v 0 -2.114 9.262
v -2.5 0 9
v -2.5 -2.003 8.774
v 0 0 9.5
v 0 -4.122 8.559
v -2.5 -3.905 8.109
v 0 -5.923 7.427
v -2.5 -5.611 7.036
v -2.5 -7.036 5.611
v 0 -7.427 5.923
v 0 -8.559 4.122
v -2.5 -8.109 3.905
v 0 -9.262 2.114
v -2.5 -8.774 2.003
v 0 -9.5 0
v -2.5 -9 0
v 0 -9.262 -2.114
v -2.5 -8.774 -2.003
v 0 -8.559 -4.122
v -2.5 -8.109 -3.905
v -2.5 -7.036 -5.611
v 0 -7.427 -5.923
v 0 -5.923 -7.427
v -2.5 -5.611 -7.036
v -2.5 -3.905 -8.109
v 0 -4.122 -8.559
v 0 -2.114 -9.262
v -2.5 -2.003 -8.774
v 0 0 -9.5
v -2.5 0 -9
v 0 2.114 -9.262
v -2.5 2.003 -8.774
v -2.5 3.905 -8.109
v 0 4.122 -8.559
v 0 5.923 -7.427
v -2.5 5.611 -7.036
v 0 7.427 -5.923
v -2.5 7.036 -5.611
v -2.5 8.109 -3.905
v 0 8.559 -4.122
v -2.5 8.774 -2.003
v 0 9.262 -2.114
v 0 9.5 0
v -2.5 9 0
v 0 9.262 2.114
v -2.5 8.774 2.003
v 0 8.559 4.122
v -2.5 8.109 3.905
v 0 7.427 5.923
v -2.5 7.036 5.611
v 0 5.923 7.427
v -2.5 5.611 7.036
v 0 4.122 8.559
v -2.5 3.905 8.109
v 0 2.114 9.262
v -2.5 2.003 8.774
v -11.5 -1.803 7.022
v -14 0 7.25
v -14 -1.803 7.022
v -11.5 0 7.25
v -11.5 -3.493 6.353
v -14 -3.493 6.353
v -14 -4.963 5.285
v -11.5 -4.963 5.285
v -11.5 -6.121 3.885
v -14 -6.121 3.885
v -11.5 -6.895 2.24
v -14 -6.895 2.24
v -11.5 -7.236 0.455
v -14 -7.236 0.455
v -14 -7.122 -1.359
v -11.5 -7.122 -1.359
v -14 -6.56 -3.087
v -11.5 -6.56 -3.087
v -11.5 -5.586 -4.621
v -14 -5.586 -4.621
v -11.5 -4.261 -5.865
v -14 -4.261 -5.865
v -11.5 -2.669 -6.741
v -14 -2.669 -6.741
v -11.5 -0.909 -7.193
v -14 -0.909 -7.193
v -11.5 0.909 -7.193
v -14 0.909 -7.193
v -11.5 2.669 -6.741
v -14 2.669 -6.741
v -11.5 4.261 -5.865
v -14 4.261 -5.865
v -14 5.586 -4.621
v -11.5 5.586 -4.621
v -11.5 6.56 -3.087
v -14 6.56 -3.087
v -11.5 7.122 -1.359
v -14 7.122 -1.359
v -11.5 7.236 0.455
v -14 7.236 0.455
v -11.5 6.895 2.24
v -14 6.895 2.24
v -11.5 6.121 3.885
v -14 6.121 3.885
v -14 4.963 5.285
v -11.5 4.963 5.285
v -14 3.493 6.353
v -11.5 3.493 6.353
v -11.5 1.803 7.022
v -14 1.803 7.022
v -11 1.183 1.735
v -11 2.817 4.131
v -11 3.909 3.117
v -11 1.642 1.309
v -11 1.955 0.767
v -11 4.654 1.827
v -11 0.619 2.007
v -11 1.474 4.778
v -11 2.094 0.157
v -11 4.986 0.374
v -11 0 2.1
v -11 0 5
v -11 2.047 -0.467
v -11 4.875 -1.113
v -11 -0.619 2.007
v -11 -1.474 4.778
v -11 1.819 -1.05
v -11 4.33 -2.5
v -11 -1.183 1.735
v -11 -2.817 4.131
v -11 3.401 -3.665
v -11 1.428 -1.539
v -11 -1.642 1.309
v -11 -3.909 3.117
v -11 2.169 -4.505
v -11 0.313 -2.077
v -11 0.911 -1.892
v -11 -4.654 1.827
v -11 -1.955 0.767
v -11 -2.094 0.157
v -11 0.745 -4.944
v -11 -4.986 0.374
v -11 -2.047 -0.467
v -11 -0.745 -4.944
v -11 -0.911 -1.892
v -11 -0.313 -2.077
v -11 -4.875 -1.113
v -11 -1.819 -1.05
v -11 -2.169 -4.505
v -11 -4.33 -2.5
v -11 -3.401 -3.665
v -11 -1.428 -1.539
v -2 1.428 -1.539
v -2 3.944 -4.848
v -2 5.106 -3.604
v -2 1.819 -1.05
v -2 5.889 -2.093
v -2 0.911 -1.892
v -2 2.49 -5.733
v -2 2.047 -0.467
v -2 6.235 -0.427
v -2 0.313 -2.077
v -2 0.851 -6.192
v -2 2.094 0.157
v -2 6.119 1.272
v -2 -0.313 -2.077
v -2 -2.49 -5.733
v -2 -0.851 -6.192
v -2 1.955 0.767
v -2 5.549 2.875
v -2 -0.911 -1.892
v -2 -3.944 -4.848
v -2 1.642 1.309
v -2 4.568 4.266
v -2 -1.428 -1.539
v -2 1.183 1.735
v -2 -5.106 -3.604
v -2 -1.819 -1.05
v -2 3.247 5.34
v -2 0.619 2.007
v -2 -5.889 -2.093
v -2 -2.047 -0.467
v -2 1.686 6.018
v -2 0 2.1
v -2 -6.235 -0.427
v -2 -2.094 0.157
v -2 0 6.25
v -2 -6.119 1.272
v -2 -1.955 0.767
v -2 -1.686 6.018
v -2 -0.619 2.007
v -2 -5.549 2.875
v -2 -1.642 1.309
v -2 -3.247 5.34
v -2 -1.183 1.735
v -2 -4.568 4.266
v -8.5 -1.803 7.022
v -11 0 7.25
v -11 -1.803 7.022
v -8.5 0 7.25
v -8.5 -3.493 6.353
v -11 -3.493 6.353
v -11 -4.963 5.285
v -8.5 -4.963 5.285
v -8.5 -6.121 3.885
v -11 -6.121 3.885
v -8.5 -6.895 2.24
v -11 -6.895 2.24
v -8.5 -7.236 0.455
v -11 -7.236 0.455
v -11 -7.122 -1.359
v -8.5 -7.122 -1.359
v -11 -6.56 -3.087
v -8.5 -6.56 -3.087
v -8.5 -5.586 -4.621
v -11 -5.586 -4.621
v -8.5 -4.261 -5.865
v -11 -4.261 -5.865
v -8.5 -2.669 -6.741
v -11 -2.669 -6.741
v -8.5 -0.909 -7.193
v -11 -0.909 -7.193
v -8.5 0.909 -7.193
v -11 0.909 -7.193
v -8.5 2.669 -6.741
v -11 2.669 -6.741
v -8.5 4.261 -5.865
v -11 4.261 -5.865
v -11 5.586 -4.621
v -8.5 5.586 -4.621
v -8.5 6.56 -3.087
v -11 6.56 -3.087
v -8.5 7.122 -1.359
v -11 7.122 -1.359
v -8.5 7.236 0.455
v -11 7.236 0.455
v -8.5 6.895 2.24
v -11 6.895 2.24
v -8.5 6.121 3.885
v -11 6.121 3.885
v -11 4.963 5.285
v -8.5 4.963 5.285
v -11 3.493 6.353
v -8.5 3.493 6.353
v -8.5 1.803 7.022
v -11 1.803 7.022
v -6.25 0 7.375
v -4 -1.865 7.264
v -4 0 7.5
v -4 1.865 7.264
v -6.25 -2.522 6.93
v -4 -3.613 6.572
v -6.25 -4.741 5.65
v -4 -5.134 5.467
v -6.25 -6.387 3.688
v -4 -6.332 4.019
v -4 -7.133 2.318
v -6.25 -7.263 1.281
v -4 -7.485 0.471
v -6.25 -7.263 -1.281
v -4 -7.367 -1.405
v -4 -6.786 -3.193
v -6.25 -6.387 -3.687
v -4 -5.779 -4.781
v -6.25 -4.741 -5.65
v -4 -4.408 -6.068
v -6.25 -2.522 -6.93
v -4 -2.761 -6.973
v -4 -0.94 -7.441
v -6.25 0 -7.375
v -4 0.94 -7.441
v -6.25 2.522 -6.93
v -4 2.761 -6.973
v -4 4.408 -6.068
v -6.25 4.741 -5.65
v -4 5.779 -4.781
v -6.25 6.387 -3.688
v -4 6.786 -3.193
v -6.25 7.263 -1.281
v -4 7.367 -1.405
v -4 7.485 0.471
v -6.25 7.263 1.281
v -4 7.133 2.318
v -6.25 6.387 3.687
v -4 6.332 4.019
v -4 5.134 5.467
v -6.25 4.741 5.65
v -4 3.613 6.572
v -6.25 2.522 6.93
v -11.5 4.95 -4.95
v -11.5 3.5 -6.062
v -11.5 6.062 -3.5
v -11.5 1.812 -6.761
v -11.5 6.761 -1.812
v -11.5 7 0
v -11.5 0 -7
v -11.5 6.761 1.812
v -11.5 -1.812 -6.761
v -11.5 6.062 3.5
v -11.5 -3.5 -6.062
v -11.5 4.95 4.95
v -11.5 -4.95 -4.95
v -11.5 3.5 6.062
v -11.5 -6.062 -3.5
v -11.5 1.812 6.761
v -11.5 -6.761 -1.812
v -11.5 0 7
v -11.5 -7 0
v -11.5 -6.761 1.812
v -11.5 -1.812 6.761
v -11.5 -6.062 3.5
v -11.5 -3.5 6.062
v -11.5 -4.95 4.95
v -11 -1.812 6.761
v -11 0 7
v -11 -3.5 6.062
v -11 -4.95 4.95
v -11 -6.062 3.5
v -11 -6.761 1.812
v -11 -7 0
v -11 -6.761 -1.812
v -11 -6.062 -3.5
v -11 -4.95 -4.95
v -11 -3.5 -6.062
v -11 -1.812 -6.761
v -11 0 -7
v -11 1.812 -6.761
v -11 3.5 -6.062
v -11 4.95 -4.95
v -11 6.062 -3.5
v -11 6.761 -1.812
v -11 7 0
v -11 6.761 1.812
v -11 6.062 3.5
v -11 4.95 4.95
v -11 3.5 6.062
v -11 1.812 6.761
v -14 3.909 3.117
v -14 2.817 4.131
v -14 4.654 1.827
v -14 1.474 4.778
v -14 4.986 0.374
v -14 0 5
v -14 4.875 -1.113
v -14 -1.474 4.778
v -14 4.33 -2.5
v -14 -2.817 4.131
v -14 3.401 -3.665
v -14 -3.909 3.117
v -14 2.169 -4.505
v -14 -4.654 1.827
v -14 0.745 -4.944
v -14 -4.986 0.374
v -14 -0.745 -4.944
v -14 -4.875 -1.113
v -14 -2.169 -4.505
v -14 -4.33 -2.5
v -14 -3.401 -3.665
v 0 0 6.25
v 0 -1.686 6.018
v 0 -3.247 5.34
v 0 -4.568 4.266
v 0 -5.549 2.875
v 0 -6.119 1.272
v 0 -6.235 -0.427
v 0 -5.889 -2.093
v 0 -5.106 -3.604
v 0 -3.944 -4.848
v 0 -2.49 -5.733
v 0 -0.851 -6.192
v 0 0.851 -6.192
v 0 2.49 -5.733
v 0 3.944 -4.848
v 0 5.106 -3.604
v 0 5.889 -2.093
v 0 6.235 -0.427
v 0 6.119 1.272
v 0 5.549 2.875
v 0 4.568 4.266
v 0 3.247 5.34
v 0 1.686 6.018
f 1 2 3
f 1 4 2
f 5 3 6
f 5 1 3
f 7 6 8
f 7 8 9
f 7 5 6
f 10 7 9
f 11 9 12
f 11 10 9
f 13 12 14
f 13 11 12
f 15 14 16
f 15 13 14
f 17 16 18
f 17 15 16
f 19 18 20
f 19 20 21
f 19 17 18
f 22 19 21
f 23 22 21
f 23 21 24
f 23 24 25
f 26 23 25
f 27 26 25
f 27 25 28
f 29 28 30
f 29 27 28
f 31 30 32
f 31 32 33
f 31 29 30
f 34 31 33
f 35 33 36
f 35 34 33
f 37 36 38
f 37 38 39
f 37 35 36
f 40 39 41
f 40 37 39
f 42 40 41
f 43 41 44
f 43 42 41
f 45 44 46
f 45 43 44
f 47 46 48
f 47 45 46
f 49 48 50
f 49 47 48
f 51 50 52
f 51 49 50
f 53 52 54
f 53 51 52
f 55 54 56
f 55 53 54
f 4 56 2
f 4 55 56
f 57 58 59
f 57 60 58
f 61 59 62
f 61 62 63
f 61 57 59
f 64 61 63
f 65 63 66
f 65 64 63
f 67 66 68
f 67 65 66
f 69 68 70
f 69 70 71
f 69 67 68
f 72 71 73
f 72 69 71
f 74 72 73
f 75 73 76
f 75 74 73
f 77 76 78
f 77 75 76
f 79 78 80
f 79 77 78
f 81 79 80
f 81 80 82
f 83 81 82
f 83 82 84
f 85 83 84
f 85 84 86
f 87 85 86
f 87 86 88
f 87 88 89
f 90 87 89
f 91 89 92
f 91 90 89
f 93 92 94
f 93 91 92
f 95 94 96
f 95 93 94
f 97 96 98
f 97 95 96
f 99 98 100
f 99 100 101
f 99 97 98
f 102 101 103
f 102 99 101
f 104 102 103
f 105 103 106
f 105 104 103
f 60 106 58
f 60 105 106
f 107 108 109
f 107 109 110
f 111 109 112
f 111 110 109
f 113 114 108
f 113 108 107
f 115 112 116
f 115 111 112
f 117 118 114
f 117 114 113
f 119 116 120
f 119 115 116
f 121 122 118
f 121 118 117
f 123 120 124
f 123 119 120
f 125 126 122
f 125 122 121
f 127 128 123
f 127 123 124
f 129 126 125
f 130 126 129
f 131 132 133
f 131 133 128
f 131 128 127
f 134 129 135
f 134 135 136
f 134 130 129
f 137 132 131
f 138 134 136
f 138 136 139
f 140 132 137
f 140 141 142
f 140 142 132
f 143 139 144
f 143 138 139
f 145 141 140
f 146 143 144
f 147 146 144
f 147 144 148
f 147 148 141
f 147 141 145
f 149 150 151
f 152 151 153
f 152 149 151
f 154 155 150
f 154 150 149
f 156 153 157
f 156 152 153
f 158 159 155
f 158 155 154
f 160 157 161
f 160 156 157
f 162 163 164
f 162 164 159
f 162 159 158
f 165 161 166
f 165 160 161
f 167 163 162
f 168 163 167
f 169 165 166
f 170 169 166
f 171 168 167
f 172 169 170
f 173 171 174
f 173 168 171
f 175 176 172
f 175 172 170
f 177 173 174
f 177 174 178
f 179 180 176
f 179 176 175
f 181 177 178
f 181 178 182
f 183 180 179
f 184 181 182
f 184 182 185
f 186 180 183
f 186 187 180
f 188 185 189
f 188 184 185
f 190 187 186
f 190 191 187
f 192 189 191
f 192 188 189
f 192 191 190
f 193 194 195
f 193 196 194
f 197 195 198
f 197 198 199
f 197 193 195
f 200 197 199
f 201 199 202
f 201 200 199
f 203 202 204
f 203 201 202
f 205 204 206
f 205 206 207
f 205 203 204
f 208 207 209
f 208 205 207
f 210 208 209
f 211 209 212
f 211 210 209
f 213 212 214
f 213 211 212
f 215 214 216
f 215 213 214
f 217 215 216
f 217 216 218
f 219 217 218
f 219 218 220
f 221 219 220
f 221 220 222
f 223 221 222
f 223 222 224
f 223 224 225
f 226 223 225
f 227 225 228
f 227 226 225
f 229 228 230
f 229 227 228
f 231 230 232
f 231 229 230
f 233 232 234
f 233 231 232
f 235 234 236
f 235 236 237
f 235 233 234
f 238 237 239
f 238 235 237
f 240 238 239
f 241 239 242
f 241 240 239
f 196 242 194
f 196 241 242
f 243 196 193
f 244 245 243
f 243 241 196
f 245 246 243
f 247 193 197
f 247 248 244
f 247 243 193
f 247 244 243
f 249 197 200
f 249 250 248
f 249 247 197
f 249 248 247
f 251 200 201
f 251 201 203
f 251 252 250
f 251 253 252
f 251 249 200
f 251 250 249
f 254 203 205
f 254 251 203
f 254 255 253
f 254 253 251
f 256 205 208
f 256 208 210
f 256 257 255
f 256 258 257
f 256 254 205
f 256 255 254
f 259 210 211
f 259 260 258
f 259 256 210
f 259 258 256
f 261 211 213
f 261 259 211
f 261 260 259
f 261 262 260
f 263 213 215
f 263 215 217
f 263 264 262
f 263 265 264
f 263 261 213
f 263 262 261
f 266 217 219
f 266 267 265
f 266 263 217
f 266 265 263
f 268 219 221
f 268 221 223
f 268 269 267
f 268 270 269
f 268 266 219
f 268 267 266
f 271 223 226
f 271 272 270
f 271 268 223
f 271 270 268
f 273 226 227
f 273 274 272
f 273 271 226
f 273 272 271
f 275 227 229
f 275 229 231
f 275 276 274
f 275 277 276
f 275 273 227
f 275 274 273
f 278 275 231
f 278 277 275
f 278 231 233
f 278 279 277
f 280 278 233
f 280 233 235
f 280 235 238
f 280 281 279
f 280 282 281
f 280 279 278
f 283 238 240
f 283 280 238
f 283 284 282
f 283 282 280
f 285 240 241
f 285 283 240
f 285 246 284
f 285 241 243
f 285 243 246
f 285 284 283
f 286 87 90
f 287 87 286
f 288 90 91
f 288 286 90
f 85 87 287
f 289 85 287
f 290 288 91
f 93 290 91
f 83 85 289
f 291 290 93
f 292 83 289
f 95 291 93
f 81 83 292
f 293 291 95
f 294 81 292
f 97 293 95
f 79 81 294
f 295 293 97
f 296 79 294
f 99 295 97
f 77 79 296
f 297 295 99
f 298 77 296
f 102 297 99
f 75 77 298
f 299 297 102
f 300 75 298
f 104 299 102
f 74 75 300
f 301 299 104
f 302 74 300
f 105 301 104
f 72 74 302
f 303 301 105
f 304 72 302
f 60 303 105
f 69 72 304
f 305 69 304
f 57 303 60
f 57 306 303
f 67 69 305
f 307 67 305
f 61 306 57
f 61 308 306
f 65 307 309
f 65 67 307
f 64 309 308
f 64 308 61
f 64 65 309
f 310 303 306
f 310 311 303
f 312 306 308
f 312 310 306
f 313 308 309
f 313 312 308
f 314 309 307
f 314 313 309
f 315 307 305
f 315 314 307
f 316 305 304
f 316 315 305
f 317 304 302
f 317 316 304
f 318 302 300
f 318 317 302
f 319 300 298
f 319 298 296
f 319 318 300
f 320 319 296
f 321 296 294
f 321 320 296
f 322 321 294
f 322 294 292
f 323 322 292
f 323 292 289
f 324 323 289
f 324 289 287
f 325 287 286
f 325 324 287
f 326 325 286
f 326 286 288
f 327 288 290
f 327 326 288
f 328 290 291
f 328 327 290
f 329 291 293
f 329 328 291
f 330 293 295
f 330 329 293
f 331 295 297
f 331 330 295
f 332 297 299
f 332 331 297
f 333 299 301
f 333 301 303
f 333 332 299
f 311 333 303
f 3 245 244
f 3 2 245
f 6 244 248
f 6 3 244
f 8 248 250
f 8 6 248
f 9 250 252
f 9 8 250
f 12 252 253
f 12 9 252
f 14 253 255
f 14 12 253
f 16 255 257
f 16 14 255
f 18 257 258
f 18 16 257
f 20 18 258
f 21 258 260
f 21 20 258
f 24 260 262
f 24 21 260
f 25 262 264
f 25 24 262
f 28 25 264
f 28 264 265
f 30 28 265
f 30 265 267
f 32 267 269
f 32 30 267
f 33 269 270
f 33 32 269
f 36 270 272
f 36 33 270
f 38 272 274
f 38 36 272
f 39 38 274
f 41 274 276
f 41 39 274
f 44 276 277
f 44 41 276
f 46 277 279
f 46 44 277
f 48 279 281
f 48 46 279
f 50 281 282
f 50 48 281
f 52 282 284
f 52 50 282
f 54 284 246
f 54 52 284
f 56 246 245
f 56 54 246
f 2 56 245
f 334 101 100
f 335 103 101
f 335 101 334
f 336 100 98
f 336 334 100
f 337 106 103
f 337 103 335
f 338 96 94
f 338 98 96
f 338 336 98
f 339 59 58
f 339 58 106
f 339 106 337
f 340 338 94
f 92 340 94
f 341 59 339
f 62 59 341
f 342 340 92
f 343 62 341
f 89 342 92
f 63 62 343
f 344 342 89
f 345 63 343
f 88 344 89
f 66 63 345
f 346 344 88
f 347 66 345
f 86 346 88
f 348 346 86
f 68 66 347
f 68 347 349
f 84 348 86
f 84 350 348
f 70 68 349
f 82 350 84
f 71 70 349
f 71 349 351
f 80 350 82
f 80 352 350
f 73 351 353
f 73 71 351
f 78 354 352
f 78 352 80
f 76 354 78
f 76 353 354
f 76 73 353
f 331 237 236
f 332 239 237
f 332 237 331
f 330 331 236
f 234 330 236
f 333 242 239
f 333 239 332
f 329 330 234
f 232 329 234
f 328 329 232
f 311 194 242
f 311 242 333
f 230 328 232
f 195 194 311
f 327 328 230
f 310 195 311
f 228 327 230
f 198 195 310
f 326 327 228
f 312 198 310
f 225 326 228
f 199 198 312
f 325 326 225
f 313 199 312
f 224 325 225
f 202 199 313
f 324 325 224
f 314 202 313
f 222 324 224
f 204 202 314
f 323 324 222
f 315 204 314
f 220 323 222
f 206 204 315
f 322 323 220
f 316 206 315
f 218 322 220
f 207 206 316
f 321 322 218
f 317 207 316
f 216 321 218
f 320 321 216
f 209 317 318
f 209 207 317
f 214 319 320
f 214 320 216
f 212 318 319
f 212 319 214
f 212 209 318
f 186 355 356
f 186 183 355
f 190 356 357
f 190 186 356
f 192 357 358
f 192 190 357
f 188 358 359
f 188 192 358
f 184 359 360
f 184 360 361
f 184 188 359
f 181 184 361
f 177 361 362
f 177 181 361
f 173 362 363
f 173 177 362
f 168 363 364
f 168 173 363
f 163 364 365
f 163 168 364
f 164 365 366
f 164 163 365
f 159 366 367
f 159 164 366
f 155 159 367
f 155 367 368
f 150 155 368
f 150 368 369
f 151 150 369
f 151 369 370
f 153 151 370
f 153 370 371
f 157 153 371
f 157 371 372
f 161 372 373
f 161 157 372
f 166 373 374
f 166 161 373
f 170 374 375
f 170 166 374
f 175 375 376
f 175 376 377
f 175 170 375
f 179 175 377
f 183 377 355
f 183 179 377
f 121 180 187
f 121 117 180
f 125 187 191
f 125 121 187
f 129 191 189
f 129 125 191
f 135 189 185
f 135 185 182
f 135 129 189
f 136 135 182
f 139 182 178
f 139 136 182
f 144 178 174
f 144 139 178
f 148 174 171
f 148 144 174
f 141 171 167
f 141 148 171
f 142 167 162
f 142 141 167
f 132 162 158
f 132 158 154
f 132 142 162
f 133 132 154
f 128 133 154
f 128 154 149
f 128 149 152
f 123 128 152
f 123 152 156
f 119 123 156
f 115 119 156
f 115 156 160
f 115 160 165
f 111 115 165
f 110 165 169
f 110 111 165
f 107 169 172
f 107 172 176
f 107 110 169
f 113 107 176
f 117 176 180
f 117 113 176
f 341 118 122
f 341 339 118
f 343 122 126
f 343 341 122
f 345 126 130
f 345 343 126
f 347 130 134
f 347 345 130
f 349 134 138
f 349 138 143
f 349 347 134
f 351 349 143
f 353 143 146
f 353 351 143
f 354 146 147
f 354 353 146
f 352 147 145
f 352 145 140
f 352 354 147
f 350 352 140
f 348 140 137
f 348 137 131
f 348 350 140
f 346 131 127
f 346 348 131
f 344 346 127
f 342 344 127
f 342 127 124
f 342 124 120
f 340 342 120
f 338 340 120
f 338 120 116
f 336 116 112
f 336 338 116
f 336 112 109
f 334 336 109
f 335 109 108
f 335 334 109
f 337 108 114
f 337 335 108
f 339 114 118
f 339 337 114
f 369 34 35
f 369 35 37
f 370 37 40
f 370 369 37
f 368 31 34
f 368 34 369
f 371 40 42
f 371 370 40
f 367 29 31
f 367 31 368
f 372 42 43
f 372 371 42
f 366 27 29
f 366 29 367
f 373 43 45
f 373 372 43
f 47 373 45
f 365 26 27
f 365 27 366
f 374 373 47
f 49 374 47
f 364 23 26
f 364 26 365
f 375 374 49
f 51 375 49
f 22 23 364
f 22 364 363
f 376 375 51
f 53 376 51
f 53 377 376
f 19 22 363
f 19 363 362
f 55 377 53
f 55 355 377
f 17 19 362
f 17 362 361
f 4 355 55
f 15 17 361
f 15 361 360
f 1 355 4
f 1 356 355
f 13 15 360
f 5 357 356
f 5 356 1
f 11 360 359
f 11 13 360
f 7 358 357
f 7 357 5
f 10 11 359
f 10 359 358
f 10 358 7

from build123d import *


with BuildPart() as part:
    # Esquisse1 → Révolution1 (revolve)
    with BuildSketch(Plane.XY, mode=Mode.PRIVATE) as r_volution1_sk:
        Polygon((0, 9.5), (0, 6.25), (-2, 6.25), (-2, 2.1), (-11, 2.1), (-11, 5), (-14, 5), (-14, 7.25), (-11.5, 7.25), (-11.5, 7), (-11, 7), (-11, 7.25), (-8.5, 7.25), (-4, 7.5), (-2.5, 9), align=None)
    revolve(r_volution1_sk.sketch.rotate(Axis((-14.253108504, 0, 0), (1, 0, 0)), 90), axis=Axis((-14.253108504, 0, 0), (1, 0, 0)))  # turned: the seam where the file's is


solid = part.part
